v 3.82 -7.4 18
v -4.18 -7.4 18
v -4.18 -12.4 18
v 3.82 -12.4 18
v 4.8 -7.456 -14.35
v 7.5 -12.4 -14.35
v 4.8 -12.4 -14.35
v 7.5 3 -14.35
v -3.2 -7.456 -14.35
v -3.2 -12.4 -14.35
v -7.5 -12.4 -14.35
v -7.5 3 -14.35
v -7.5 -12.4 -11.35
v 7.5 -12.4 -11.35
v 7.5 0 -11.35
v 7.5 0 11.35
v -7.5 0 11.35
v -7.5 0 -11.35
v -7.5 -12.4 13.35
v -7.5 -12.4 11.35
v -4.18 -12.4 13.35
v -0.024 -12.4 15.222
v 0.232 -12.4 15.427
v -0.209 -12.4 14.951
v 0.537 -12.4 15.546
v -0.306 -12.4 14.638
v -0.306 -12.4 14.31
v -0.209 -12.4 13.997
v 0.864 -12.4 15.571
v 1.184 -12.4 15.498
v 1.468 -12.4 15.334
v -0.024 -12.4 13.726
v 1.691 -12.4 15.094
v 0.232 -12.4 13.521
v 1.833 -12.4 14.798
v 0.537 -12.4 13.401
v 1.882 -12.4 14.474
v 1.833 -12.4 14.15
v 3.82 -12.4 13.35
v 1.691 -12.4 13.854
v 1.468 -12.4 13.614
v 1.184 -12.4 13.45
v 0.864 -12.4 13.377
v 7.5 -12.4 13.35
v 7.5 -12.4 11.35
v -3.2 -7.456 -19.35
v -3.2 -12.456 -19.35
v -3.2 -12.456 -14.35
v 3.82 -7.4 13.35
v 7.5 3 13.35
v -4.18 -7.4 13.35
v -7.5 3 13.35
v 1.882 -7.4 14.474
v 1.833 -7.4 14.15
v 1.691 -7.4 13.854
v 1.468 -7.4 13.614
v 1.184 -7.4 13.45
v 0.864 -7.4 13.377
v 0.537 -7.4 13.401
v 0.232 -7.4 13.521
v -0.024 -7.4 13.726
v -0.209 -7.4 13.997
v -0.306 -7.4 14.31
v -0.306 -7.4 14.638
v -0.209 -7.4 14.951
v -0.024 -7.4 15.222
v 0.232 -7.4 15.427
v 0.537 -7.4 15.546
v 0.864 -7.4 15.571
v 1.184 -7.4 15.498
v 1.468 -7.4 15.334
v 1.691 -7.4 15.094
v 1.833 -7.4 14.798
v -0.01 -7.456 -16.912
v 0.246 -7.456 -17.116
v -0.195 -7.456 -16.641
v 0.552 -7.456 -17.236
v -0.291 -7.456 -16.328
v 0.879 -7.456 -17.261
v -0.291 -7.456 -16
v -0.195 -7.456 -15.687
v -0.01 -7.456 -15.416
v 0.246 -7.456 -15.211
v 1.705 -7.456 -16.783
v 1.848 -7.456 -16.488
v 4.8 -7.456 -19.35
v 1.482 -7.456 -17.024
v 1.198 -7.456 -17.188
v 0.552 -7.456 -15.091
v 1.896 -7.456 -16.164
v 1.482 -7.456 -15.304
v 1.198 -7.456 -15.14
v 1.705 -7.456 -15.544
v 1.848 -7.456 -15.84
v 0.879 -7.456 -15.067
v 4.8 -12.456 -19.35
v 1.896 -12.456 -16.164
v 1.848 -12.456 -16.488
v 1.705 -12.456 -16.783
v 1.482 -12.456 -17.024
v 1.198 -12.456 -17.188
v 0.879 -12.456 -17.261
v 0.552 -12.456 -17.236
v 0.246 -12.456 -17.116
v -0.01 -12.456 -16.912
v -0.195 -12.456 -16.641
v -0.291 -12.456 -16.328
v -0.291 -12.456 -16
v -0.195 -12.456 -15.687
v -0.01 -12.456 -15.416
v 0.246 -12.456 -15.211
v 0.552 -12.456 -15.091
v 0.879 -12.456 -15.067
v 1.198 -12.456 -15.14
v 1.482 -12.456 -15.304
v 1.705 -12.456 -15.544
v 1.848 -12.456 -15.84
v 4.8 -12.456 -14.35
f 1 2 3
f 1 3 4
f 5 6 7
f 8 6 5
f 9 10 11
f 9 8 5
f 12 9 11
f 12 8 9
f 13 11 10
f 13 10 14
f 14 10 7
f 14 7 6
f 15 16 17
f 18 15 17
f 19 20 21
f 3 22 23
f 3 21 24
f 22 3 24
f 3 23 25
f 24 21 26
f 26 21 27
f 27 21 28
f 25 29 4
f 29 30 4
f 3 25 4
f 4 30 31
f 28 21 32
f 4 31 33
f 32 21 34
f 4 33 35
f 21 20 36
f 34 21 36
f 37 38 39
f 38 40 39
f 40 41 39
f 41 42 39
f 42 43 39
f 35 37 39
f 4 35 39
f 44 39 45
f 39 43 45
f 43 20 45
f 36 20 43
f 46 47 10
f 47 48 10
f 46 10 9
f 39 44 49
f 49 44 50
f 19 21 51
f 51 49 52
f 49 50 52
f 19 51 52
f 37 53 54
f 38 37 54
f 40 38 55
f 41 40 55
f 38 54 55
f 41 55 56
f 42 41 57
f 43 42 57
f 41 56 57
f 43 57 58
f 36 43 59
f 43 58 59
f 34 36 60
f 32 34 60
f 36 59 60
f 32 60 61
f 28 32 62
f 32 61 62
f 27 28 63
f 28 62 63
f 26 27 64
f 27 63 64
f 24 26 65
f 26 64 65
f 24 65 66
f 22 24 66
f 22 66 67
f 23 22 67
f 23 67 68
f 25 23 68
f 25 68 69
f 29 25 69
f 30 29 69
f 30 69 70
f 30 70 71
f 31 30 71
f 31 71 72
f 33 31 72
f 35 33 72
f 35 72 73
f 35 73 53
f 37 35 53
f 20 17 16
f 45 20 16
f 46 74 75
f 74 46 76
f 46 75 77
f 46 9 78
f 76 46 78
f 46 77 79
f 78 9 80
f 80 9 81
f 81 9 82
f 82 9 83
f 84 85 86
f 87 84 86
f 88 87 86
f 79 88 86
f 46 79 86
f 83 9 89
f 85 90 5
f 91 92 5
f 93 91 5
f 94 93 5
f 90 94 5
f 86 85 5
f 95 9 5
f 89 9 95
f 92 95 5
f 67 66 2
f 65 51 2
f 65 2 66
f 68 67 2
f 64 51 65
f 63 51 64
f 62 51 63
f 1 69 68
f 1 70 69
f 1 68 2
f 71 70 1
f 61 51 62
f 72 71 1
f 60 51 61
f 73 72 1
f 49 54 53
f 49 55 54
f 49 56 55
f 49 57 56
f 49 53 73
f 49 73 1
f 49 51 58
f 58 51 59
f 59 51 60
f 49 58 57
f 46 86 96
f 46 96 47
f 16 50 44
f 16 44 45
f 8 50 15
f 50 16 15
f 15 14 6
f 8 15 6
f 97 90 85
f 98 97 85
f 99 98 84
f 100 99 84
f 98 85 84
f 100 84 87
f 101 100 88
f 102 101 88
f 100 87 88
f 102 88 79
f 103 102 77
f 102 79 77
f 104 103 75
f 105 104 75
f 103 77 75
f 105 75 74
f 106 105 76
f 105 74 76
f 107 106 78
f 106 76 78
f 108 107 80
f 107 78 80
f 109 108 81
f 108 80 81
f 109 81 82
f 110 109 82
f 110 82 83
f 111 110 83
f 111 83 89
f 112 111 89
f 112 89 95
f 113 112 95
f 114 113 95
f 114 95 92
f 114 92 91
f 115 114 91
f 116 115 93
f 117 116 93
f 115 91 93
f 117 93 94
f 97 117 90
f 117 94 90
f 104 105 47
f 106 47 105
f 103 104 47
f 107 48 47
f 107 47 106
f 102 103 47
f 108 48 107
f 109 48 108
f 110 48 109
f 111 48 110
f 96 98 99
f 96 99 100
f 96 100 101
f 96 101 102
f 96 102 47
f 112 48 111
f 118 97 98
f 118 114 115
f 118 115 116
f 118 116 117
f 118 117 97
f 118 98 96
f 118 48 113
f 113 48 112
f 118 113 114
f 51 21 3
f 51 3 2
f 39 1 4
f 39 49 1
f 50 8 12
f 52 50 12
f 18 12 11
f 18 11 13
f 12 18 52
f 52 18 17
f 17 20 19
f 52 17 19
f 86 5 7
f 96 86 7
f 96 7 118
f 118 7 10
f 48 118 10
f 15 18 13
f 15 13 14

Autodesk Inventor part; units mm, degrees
ref_plane "YZ Plane" through (0, 0, 0) normal (1, 0, 0) x (0, 1, 0)
ref_plane "XZ Plane" through (0, 0, 0) normal (0, 1, 0) x (-1, 0, 0)
ref_plane "XY Plane" through (0, 0, 0) normal (0, 0, 1) x (1, 0, 0)
sketch "Sketch1" plane through (0, 0, 0) normal (0, 1, 0) x (-1, 0, 0)
  line L0 (7.5, 11.35) -> (-7.5, 11.35)
  line L1 (-7.5, 11.35) -> (-7.5, -11.35)
  line L2 (-7.5, -11.35) -> (7.5, -11.35)
  line L3 (7.5, -11.35) -> (7.5, 11.35)
  line L4 (7.5, 11.35) -> (-7.5, -11.35) construction
  line L5 (-7.5, 11.35) -> (7.5, -11.35) construction
  point P0 (0, 0)
  dimension "d0" = 15
  dimension "d1" = 22.7
extrude "Extrusion1" add sketch "Sketch1" along normal blind 3
sketch "Sketch2" plane through (0, 3, 0) normal (0, 1, 0) x (1, 0, 0)
  line L0 (-7.5, 11.35) -> (-7.5, -11.35) projected
  line L1 (-7.5, -11.35) -> (7.5, -11.35)
  line L2 (7.5, -11.35) -> (7.5, -13.35)
  line L3 (7.5, -13.35) -> (-7.5, -13.35)
  line L4 (-7.5, -13.35) -> (-7.5, -11.35)
  line L5 (-7.5, 11.35) -> (7.5, 11.35)
  line L6 (7.5, 11.35) -> (7.5, 14.35)
  line L7 (7.5, 14.35) -> (-7.5, 14.35)
  line L8 (-7.5, 14.35) -> (-7.5, 11.35)
  point P0 (0, 0)
  dimension "d4" = 15
  dimension "d5" = 2
  dimension "d6" = 3
extrude "Extrusion2" add sketch "Sketch2" against normal blind 15.4
sketch "Sketch3" plane through (-7.5, 3, 13.35) normal (0, 0, 1) x (1, 0, 0)
  line L0 (3.3204, -10.4) -> (11.3204, -10.4)
  line L1 (11.3204, -10.4) -> (11.3204, -15.4)
  line L2 (3.3204, -15.4) -> (3.3204, -10.4)
  line L3 (15, -15.4) -> (0, -15.4) projected
  line L4 (3.3204, -10.4) -> (7.5, -15.4) construction
  line L5 (11.3204, -10.4) -> (7.5, -15.4) construction
  line L6 (3.3204, -15.4) -> (11.3204, -15.4)
  point P0 (7.5, -3)
  dimension "d9" = 8
  dimension "d10" = 5
extrude "Extrusion3" add sketch "Sketch3" along normal blind 4.65
sketch "Sketch4" plane through (-4.1796, -7.4, 13.35) normal (0, 1, 0) x (1, 0, 0)
  circle A0 centre (4.9615, -1.1239) radius 1.1
  point P0 (4.1796, 13.35)
  dimension "d13" = 2.2
extrude "Extrusion4" cut sketch "Sketch4" against normal blind 6.4
sketch "Sketch5" plane through (7.5, 3, -14.35) normal (0, 0, -1) x (-1, 0, 0)
  line L0 (10.6996, -10.4559) -> (2.6996, -10.4559)
  line L1 (2.6996, -10.4559) -> (2.6996, -15.4559)
  line L2 (10.6996, -15.4559) -> (10.6996, -10.4559)
  line L3 (7.8181, -10.4) -> (7.8181, -15.4) projected
  line L4 (10.6996, -10.4559) -> (7.8181, -15.4559) construction
  line L5 (2.6996, -10.4559) -> (7.8181, -15.4559) construction
  line L6 (10.6996, -15.4559) -> (2.6996, -15.4559)
  point P0 (7.5, -3)
  point P1 (6.6996, -15.4559)
  point P2 (6.6996, -10.4559)
  dimension "d16" = 8
  dimension "d18" = 5
extrude "Extrusion5" add sketch "Sketch5" along normal blind 5
sketch "Sketch6" plane through (-3.1996, -7.4559, -14.35) normal (0, 1, 0) x (1, 0, 0)
  circle A0 centre (3.9961, 1.8138) radius 1.1
  point P0 (3.1996, -14.35)
  dimension "d21" = 2.2
extrude "Extrusion6" cut sketch "Sketch6" against normal blind 5
properties part number "Sostiene motor_3DPrint"
